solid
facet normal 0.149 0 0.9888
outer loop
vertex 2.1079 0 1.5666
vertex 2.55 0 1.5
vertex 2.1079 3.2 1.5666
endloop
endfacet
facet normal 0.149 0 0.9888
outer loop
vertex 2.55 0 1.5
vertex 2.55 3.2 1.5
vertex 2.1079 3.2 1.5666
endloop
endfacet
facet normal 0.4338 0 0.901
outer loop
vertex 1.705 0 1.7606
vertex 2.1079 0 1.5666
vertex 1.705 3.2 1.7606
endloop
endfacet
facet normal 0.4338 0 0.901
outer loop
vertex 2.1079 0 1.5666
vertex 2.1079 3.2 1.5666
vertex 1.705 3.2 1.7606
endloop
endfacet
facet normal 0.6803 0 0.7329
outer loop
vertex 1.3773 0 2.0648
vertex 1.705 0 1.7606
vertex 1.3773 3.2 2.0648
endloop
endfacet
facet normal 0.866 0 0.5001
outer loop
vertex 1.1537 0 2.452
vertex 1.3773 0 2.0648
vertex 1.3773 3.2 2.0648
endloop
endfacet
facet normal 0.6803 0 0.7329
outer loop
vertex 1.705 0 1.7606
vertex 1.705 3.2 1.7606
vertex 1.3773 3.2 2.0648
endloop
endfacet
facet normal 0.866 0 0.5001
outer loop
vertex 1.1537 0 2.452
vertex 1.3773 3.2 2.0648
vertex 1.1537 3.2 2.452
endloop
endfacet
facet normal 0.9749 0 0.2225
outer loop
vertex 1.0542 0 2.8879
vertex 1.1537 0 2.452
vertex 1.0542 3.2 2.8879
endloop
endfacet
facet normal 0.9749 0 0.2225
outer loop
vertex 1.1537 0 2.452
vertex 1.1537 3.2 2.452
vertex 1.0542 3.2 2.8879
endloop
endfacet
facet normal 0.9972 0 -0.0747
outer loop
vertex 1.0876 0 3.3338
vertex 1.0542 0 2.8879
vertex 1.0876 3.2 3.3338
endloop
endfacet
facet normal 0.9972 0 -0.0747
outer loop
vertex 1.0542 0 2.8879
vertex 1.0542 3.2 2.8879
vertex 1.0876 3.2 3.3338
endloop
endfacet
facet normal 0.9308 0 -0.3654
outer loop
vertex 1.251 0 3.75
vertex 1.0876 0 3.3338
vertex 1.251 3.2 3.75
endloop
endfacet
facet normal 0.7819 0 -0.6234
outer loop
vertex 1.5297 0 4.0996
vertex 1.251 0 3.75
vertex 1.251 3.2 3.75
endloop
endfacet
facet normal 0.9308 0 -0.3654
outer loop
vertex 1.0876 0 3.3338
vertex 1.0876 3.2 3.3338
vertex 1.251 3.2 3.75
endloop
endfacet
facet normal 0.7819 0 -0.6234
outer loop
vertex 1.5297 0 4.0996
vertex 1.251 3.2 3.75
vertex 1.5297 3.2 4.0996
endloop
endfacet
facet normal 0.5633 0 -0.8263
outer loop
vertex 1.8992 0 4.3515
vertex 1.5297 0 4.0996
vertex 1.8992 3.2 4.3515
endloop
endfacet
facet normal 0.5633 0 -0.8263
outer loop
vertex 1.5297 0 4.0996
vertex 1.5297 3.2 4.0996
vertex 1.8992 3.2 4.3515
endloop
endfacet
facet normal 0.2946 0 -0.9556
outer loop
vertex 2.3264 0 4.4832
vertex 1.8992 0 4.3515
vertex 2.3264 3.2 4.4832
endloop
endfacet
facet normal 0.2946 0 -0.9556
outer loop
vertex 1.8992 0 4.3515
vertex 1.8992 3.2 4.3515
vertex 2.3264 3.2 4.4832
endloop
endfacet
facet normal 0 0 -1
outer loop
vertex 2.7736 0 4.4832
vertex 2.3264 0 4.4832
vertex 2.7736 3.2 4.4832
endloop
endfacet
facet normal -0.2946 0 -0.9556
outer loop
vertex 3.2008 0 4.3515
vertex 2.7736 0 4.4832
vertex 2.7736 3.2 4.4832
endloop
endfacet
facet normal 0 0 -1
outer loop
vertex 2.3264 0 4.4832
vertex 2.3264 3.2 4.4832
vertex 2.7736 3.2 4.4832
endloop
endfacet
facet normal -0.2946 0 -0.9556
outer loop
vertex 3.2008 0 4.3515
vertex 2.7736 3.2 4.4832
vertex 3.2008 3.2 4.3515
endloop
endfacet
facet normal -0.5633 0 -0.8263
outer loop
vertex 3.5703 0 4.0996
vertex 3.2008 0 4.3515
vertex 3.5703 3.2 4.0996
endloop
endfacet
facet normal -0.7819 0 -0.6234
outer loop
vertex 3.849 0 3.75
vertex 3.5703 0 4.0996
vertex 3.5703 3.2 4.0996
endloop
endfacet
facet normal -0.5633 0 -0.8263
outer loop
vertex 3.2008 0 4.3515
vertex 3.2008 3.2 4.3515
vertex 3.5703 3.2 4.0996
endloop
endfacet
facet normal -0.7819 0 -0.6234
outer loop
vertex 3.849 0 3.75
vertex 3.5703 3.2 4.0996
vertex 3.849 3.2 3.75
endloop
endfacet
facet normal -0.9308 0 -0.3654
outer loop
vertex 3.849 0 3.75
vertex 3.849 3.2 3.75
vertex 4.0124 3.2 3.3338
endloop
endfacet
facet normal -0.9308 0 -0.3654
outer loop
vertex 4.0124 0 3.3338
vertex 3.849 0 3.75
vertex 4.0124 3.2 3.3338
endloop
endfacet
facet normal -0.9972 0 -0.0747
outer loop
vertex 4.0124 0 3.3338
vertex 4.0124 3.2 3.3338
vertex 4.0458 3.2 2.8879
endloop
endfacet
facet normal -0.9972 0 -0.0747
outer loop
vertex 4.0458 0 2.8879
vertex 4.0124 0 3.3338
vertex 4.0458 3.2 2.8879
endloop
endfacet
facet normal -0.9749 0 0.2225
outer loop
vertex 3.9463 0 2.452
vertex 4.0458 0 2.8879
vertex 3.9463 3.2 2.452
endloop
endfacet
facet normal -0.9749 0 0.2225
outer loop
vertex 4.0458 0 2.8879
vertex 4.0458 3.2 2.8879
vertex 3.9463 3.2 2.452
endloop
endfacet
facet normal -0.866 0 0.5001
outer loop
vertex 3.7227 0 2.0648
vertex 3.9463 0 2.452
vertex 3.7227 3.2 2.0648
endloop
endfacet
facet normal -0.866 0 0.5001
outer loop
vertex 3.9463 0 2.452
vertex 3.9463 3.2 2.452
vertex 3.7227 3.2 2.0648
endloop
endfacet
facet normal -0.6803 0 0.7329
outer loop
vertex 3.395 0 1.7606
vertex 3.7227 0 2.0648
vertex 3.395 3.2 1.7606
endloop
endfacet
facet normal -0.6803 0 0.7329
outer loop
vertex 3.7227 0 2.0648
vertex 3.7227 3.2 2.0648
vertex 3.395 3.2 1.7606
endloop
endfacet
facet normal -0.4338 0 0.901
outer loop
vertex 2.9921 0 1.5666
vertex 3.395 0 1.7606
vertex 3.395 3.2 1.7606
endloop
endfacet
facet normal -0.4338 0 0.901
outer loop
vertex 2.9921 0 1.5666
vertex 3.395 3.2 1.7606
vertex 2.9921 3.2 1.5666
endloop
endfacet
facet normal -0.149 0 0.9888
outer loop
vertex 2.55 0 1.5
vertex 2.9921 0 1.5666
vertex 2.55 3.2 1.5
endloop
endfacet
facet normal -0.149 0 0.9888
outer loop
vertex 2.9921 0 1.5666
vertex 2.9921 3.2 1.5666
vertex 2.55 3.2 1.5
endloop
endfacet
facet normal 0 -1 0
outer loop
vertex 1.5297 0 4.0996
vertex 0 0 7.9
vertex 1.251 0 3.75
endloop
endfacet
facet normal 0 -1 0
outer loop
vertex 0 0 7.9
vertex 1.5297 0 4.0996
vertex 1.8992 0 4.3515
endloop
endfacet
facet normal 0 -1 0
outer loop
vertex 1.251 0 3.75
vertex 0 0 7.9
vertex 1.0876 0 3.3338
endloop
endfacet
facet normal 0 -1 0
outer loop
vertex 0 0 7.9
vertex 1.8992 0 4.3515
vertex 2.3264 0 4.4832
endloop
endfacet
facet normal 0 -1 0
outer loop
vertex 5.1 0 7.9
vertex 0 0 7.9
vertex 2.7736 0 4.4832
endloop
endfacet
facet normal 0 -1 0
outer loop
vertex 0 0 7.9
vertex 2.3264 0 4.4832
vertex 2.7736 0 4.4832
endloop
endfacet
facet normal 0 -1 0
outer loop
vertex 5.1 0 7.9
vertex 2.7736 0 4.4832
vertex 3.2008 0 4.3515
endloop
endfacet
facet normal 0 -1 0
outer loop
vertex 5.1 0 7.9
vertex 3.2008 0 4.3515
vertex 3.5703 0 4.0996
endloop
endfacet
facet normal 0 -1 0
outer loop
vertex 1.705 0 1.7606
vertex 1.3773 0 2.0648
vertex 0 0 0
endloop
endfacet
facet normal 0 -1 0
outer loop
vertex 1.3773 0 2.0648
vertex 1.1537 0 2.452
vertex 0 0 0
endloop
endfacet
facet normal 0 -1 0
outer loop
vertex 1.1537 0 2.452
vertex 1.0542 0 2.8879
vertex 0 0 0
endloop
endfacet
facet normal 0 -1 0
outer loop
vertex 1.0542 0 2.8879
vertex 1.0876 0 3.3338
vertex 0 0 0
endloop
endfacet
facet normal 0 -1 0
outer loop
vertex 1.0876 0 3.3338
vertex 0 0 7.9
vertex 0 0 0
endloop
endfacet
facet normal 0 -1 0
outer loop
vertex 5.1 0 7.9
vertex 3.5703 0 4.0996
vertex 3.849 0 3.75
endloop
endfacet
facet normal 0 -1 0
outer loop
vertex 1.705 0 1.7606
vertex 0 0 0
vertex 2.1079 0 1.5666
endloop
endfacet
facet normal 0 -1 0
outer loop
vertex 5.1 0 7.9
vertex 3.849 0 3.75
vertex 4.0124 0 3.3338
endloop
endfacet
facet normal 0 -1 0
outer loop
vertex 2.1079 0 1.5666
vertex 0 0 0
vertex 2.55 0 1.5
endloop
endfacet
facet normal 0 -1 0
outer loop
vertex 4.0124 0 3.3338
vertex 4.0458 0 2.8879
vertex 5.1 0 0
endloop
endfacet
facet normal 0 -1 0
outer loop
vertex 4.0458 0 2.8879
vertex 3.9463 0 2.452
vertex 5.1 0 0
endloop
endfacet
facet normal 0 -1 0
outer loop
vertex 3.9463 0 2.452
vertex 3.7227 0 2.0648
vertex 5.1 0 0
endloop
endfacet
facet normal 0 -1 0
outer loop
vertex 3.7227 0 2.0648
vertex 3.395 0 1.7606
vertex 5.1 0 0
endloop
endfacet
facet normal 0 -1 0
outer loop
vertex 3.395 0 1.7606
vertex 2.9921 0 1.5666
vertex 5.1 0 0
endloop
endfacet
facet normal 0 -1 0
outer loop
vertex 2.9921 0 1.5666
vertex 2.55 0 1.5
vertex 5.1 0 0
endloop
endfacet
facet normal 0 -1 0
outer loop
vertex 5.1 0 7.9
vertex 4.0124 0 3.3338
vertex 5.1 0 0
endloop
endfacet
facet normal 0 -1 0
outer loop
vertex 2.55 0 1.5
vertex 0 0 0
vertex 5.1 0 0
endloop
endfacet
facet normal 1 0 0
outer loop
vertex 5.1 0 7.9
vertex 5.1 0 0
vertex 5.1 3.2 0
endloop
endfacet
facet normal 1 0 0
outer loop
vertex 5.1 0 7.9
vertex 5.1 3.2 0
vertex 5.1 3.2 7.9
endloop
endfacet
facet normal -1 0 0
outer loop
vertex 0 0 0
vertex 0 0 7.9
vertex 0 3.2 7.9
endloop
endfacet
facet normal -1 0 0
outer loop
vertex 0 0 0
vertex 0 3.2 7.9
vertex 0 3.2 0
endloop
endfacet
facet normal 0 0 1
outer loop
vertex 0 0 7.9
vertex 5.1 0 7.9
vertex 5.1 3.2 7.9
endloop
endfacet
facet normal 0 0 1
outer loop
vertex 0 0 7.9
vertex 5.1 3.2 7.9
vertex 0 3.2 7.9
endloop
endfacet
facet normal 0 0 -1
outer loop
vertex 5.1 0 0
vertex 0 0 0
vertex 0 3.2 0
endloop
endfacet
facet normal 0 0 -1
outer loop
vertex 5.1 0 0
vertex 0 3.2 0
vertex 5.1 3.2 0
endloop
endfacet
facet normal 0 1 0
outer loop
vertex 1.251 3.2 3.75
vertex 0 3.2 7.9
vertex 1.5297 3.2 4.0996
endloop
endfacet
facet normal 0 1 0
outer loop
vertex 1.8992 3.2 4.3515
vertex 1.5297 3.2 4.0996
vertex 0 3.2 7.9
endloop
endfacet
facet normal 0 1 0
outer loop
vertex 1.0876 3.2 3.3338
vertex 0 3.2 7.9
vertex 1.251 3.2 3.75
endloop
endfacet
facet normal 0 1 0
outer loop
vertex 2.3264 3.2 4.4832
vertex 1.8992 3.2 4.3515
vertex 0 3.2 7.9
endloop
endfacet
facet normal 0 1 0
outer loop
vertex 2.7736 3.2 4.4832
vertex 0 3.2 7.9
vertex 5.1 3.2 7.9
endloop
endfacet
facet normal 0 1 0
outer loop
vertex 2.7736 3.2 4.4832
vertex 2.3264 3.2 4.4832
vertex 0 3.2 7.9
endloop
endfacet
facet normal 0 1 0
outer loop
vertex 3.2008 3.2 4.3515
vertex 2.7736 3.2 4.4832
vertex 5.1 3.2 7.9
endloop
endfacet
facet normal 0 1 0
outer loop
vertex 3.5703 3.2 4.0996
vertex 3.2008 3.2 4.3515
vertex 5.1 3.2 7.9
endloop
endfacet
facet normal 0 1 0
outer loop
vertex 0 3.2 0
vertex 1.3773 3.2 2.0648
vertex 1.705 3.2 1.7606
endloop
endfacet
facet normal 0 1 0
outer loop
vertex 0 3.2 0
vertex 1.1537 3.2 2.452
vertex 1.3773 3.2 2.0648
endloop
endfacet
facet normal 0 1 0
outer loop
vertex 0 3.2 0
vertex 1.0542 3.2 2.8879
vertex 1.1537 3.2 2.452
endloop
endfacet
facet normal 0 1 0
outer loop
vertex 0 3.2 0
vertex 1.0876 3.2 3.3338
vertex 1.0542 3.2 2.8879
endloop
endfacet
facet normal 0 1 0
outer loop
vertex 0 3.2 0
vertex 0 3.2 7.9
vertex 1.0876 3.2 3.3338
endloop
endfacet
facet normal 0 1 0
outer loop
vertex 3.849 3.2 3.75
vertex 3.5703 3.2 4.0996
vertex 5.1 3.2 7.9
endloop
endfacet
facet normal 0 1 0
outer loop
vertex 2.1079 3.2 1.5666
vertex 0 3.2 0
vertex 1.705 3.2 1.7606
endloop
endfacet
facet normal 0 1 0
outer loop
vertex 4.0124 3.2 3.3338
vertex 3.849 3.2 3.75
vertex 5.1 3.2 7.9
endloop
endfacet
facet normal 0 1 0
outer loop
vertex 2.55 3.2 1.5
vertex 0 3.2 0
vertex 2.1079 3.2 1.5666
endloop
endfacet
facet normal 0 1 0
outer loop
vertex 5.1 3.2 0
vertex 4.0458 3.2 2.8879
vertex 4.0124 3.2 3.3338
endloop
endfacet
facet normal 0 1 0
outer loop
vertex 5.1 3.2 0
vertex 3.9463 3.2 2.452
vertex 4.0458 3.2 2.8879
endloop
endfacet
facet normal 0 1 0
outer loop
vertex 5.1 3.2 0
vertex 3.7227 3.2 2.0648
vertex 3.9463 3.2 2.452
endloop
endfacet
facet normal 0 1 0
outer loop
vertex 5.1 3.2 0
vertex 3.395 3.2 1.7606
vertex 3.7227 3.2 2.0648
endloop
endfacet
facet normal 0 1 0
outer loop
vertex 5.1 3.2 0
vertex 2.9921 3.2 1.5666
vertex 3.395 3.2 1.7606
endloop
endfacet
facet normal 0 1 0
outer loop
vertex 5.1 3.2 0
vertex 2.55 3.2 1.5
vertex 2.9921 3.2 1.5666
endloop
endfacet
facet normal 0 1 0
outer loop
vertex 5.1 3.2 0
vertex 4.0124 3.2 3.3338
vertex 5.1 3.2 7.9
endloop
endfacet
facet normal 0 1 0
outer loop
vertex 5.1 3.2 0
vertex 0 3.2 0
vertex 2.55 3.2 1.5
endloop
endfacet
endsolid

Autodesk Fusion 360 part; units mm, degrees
sketch "Sketch1" plane through (0, 0, 0) normal (0, 1, 0) x (1, 0, 0)
  line L0 (0, 0) -> (5.1, 0)
  line L1 (5.1, 0) -> (5.1, -7.9)
  line L2 (5.1, -7.9) -> (0, -7.9)
  line L3 (0, -7.9) -> (0, 0)
  point P0 (2.55, -3)
  dimension "d1" = 5.1
  dimension "d2" = 7.9
  dimension "d5" = 2.55
  dimension "d6" = 3
extrude "Extrude1" add sketch "Sketch1" along normal blind 3.2
hole "Hole1" at (2.55, 0, 3) direction (0, 1, 0) diameter 3 depth 8 tip angle 118
equation "d5 = ( 5.1 / 2 ) * 1 mm"
